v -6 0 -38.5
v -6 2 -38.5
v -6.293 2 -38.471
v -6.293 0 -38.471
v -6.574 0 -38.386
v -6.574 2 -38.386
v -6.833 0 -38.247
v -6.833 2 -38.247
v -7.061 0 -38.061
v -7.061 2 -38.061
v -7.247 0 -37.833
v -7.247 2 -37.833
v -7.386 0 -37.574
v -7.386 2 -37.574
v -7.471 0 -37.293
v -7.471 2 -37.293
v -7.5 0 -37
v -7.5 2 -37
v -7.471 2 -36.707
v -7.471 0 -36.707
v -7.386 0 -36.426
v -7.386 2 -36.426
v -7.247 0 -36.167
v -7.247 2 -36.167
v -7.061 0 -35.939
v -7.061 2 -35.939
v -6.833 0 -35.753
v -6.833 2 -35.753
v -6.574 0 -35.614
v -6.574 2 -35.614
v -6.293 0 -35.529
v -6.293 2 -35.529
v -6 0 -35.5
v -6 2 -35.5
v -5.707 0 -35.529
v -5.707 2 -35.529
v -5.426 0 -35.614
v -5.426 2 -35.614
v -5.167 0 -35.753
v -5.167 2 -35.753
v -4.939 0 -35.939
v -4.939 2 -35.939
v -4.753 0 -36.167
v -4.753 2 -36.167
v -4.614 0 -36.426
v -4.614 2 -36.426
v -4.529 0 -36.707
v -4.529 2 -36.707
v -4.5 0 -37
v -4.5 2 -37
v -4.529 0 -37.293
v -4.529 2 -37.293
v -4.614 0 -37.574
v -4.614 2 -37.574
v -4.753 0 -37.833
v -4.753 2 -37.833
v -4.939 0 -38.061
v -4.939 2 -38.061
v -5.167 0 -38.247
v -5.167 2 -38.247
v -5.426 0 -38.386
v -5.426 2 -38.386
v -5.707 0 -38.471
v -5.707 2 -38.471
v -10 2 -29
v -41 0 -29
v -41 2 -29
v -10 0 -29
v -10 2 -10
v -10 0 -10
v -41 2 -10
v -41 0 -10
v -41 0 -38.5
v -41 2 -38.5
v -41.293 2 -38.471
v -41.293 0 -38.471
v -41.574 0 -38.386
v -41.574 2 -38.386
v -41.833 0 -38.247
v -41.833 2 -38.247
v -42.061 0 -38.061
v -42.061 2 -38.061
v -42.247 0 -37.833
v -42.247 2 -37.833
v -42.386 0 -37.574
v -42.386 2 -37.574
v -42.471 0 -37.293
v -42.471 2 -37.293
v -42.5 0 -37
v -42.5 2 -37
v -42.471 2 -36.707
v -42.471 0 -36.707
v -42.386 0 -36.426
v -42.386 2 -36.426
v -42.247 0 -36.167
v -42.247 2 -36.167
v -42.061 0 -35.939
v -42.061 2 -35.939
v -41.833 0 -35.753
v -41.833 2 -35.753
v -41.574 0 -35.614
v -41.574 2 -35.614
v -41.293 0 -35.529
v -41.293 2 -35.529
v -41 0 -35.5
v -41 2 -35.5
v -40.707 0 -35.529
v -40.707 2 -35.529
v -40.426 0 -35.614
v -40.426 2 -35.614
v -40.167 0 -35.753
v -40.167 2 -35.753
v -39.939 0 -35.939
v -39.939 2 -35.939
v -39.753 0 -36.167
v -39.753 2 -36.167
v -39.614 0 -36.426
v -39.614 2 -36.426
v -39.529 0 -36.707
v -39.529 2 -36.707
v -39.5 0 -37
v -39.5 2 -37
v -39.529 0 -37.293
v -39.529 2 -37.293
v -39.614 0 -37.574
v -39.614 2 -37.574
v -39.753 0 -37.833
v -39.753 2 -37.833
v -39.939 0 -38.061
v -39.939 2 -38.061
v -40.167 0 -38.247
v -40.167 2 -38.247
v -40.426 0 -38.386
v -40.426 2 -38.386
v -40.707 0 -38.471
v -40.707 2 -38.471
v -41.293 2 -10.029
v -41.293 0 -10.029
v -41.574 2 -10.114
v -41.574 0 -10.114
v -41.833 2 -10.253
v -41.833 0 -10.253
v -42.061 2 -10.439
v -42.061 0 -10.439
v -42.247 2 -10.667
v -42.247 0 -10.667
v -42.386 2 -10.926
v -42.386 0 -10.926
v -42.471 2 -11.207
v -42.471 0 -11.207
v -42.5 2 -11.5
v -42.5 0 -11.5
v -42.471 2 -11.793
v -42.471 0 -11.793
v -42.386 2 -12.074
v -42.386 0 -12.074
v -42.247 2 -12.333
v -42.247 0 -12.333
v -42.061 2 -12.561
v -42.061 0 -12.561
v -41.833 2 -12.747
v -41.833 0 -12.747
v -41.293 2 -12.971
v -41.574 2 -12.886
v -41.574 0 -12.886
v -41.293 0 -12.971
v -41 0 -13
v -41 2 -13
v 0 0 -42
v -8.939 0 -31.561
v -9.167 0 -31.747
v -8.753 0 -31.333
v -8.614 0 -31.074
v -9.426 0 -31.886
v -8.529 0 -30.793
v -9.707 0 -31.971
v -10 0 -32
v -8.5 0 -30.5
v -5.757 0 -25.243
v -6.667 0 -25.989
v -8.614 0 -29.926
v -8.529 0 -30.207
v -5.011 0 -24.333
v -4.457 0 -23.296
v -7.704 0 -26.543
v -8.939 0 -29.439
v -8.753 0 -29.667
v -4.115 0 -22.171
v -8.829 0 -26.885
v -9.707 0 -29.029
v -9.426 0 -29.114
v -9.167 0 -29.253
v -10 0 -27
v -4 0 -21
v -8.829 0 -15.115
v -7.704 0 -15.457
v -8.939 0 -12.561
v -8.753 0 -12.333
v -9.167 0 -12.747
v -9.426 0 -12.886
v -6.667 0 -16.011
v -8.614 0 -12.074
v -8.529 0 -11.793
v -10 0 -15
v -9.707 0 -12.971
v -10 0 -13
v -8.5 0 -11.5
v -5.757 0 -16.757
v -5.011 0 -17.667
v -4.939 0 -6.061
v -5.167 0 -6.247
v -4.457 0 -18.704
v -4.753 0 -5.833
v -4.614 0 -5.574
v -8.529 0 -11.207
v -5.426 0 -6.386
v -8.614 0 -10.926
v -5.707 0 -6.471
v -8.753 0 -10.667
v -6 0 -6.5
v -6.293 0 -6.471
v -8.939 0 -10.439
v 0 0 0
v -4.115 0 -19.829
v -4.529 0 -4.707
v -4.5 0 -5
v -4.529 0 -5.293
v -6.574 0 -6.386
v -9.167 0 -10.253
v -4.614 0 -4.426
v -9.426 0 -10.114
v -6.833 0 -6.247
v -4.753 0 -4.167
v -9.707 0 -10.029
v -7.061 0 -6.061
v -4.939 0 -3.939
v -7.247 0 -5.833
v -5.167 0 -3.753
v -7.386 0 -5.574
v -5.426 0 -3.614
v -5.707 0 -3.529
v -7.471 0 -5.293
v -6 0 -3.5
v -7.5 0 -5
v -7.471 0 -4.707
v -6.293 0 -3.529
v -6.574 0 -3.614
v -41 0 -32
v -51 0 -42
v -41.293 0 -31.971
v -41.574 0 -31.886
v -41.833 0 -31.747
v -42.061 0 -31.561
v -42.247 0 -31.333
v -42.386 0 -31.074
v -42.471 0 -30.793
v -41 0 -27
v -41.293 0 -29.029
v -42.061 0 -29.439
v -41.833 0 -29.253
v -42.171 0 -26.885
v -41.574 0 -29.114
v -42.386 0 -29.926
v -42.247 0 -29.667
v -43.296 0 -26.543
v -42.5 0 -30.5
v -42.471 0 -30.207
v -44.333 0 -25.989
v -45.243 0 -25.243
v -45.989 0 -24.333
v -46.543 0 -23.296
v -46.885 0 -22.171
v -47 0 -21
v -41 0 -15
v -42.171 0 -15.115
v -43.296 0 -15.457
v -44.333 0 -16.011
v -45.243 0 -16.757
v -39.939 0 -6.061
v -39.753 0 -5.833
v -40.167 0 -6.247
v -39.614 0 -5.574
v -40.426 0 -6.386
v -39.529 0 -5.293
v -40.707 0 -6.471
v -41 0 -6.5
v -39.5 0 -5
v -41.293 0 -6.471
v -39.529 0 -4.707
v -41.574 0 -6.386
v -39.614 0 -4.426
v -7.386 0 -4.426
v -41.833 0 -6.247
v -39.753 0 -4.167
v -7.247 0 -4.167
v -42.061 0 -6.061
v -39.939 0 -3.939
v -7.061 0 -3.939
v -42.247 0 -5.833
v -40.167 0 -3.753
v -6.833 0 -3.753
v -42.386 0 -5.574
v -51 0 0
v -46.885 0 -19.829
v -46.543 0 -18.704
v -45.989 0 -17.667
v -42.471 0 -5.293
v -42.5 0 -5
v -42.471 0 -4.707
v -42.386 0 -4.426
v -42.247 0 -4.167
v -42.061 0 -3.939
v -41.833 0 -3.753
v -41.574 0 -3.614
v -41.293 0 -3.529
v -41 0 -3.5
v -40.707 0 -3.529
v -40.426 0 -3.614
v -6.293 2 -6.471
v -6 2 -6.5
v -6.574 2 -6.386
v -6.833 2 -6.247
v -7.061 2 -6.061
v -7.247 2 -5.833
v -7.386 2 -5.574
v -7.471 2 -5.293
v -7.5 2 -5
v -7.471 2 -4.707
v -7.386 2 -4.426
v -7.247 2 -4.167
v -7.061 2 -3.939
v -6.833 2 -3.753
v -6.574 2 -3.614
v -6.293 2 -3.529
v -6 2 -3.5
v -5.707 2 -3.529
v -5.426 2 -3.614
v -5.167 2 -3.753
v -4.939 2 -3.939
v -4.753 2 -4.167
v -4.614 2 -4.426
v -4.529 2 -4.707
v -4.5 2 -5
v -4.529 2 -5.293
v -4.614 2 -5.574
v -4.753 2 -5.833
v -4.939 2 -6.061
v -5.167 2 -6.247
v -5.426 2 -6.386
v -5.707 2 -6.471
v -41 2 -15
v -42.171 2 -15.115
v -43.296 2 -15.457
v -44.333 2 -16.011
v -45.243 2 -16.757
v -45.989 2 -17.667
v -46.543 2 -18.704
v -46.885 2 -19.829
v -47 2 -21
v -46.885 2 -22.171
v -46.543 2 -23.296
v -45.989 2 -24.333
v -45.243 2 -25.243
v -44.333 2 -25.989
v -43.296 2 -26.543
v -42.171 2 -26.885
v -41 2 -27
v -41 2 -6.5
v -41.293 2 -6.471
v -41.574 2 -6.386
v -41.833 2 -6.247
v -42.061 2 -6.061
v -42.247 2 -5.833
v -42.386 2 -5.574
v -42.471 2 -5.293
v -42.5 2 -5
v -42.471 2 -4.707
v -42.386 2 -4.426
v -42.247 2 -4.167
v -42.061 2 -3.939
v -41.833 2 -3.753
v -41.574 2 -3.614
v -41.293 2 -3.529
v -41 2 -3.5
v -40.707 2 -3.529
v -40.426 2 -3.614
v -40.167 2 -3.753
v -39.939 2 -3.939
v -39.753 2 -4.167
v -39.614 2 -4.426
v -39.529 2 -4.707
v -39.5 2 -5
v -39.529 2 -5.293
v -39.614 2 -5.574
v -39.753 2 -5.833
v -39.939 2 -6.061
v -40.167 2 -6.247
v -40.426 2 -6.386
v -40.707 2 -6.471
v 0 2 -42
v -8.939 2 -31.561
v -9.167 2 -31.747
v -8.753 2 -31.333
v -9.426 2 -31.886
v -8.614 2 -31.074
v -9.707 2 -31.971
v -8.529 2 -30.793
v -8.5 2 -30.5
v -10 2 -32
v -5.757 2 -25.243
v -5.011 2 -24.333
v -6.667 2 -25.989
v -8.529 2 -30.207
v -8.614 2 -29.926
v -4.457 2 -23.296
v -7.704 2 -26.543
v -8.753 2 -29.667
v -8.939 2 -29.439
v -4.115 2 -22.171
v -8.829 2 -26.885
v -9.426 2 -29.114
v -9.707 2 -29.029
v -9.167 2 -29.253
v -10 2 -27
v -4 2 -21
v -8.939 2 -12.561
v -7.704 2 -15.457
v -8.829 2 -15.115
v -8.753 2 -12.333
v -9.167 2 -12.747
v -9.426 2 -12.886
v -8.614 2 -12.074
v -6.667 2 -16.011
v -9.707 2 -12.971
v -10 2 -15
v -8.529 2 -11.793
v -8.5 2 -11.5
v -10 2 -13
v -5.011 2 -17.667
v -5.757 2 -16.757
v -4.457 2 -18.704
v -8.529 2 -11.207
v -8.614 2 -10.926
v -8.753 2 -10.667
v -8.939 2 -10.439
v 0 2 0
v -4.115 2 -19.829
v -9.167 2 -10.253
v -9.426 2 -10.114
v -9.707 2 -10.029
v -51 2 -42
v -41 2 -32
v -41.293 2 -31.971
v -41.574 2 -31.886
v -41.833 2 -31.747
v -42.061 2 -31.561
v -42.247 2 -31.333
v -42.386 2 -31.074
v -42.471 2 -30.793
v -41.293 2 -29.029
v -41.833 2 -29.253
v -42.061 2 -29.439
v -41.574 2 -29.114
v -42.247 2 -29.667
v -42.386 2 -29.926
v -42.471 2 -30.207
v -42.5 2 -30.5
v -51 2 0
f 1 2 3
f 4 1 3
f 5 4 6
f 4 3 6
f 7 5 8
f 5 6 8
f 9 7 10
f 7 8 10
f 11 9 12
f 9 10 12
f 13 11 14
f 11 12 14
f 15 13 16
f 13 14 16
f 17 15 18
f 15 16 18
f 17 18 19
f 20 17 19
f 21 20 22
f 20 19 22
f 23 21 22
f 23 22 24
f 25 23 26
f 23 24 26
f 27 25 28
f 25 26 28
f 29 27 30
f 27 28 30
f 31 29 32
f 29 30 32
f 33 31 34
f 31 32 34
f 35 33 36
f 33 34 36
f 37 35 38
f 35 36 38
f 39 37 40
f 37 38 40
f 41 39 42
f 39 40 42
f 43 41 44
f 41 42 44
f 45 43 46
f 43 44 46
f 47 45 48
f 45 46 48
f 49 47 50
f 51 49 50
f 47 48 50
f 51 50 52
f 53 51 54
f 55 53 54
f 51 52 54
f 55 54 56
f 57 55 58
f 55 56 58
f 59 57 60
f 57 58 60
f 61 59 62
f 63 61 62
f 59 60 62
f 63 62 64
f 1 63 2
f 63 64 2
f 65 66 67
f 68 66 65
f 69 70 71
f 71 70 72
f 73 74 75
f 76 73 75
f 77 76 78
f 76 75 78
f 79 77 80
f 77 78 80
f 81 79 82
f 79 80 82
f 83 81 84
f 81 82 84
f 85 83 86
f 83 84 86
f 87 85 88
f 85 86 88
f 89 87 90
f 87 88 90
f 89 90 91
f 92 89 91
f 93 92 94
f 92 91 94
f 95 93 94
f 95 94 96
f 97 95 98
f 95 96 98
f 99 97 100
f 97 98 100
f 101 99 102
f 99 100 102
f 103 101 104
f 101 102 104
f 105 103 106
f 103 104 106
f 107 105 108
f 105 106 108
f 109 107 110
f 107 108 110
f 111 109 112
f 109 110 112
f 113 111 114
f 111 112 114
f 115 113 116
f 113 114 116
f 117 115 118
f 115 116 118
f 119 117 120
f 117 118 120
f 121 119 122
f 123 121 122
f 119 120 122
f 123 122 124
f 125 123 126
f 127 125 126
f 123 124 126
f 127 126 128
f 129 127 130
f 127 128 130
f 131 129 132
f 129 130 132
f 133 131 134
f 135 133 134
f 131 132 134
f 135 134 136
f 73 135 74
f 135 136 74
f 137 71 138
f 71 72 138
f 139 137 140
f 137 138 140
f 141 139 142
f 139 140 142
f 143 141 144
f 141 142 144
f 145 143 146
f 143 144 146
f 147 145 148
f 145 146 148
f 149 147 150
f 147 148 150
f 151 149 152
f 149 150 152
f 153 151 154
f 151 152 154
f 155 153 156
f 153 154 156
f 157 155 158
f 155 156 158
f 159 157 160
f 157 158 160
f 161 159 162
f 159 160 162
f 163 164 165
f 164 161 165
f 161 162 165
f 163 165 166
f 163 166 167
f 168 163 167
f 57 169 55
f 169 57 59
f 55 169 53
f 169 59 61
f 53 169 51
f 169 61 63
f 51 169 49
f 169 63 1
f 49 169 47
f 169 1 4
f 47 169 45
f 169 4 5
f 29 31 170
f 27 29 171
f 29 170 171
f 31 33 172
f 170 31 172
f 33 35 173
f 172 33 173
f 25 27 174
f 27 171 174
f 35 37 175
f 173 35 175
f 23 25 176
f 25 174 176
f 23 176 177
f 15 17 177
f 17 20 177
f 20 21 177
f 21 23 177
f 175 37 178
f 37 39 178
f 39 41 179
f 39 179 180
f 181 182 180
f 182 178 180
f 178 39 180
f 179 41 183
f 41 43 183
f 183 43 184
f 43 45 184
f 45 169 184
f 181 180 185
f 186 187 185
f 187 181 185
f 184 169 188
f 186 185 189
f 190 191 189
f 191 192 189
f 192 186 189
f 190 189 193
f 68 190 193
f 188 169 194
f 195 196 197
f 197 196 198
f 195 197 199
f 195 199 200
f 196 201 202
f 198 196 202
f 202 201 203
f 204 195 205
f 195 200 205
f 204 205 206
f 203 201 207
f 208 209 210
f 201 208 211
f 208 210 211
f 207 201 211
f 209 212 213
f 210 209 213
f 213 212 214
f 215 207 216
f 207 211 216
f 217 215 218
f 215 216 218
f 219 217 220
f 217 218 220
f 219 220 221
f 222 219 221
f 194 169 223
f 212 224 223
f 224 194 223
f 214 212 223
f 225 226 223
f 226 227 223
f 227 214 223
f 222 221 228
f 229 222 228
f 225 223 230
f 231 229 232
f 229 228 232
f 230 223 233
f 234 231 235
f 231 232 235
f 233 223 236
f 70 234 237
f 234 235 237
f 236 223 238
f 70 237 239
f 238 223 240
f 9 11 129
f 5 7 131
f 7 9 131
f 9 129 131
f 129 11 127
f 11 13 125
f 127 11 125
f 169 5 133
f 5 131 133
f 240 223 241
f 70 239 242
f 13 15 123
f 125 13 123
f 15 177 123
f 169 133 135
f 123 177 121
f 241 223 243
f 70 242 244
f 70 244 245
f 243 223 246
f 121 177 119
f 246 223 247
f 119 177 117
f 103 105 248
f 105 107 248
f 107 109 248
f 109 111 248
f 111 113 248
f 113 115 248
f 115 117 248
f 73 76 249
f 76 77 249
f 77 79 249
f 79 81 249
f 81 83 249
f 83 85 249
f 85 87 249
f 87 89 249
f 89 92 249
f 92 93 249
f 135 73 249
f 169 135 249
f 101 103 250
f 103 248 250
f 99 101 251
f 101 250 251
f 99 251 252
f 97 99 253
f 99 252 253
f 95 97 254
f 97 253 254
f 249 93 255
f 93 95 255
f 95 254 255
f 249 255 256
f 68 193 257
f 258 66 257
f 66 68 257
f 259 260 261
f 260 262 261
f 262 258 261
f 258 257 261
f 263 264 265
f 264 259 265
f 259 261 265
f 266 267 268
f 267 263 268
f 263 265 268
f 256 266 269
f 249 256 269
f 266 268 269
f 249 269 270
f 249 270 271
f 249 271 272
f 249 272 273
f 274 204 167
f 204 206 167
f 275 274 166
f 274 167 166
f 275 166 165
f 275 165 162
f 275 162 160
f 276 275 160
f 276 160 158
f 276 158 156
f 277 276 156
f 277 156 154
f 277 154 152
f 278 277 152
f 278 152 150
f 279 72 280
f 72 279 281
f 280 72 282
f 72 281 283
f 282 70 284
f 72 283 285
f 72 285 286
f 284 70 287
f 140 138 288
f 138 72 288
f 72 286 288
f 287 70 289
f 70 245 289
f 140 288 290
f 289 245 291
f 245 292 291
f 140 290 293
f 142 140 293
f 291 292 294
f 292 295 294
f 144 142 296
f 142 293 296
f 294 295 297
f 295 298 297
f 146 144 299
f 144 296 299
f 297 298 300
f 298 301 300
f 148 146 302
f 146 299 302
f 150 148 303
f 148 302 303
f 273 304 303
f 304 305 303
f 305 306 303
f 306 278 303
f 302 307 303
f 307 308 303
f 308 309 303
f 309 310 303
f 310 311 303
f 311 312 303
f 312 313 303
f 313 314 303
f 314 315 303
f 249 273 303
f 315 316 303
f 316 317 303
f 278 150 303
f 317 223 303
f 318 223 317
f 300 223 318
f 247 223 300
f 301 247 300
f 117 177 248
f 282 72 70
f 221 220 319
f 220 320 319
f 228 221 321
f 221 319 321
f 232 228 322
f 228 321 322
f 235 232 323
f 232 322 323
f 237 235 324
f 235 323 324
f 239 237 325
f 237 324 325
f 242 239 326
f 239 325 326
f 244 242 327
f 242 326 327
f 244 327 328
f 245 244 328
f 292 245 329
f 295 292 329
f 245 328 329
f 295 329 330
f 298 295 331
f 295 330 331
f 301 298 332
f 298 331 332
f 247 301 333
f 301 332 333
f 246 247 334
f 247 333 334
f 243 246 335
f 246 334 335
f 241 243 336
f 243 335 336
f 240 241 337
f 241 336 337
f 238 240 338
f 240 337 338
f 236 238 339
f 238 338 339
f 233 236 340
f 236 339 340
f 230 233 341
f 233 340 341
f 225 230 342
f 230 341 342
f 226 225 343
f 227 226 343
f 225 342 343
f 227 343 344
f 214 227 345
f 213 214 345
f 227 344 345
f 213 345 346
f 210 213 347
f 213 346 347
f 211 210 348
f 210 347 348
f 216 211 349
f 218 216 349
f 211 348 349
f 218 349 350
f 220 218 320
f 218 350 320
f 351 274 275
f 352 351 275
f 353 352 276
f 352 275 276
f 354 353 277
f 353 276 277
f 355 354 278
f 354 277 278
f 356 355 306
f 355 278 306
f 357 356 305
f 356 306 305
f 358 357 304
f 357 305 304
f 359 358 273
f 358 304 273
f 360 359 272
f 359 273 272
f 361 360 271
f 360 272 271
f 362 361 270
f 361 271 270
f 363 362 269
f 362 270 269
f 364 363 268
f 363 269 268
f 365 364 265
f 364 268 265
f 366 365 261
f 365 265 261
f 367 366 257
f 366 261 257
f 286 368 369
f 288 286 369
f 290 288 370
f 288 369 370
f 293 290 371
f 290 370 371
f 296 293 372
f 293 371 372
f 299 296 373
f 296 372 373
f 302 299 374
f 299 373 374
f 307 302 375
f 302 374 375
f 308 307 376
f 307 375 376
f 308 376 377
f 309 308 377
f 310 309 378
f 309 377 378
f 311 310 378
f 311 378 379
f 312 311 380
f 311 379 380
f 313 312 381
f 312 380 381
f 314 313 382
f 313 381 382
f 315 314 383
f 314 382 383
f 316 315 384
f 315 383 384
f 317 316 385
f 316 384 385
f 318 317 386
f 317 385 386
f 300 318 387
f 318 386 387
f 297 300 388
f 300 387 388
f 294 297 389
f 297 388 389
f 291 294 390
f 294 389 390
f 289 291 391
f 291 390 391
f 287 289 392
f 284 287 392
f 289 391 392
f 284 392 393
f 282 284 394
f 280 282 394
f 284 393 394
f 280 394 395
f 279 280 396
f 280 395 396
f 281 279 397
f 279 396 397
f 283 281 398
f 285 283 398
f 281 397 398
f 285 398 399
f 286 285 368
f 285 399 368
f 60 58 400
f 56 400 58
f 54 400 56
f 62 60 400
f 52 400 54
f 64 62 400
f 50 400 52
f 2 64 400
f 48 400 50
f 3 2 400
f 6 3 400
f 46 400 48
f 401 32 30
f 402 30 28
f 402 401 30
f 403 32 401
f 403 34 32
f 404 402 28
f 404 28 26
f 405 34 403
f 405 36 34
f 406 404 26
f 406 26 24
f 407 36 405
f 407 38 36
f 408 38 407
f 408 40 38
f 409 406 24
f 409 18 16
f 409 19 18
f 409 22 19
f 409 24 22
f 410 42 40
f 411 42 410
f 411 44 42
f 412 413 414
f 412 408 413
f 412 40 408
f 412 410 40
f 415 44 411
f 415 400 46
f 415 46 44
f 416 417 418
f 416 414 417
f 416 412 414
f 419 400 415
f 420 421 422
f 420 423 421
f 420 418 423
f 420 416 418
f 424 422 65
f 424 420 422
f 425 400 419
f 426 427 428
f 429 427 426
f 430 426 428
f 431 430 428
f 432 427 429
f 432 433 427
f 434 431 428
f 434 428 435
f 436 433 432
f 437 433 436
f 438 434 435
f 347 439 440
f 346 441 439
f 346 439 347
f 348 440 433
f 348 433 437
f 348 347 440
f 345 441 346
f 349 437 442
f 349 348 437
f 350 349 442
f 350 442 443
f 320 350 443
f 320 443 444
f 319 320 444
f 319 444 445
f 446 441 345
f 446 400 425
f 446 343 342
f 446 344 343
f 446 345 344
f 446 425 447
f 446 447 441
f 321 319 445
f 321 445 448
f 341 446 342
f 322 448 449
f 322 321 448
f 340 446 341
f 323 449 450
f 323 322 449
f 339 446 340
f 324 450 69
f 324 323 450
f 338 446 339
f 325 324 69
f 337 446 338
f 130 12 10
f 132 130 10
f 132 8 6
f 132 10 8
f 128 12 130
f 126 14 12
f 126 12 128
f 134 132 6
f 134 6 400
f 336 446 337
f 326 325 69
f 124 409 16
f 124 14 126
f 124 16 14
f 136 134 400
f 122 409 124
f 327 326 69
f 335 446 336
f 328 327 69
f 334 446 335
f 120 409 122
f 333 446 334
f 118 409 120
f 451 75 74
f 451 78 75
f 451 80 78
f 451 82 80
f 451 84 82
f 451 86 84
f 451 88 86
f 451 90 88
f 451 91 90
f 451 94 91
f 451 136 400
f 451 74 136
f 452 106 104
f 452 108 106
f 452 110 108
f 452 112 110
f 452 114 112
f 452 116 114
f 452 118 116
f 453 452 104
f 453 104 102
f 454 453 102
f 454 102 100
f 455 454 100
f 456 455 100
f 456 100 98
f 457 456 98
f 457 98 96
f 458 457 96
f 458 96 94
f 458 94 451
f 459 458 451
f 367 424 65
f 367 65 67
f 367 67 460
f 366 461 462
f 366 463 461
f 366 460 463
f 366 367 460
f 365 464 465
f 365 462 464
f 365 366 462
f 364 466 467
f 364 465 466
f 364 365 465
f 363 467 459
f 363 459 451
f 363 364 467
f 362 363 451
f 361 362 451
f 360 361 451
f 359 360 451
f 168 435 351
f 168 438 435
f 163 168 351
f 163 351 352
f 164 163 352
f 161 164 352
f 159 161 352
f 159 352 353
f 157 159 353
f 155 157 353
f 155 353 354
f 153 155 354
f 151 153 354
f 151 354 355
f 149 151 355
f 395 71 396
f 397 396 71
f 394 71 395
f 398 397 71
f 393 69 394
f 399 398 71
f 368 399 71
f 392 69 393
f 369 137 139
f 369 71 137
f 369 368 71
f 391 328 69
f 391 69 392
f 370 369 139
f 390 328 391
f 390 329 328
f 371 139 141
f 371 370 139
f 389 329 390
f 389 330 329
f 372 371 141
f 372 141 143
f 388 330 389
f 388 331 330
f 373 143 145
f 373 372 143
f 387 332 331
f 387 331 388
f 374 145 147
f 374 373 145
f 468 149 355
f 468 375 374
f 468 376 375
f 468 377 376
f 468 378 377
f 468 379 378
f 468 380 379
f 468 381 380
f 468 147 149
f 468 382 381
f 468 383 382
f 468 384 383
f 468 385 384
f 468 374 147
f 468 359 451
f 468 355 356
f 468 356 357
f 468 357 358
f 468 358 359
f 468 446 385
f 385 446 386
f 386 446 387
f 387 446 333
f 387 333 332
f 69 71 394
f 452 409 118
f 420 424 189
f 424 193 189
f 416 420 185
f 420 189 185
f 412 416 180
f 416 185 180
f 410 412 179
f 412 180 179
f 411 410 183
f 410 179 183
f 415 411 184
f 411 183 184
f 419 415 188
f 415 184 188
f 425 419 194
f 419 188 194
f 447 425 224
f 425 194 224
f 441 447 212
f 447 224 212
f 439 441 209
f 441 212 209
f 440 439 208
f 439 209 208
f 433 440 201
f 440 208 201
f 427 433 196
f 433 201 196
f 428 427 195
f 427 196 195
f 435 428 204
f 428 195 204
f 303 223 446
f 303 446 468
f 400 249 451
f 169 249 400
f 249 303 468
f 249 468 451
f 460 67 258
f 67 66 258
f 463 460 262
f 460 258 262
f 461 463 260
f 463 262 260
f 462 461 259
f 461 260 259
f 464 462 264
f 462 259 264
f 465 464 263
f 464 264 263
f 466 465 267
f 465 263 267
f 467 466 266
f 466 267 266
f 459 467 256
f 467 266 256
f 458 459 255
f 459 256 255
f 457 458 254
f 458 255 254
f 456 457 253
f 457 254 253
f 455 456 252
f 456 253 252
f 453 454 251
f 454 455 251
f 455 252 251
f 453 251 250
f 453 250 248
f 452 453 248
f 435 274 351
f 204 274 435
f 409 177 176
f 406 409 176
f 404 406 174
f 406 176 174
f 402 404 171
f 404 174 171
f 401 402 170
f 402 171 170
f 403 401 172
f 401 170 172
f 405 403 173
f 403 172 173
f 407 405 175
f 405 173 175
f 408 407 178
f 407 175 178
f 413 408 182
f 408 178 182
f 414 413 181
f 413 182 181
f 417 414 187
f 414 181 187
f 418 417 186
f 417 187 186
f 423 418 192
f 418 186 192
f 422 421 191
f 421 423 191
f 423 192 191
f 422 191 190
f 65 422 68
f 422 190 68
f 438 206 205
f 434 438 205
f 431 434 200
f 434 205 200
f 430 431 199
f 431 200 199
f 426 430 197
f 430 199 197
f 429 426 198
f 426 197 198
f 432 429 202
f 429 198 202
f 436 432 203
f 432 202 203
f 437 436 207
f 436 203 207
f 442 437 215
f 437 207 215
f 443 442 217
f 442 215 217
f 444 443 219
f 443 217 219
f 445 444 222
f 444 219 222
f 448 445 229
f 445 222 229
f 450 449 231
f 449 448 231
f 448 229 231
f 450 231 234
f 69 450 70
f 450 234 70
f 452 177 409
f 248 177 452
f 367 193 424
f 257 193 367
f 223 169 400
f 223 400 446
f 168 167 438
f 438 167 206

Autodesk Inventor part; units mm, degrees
ref_plane "YZ Plane" through (0, 0, 0) normal (1, 0, 0) x (0, 1, 0)
ref_plane "XZ Plane" through (0, 0, 0) normal (0, 1, 0) x (-1, 0, 0)
ref_plane "XY Plane" through (0, 0, 0) normal (0, 0, 1) x (1, 0, 0)
sketch "Sketch1" plane through (0, 0, 0) normal (0, 1, 0) x (-1, 0, 0)
  line L0 (0, 0) -> (51, 0)
  line L1 (51, 0) -> (51, -42)
  line L2 (51, -42) -> (0, -42)
  line L3 (0, -42) -> (0, 0)
  line L4 (51, -21) -> (0, -21)
  line L5 (25.5, 0) -> (25.5, -42)
  line L6 (41, -21) -> (10, -21) construction
  line L7 (41, -15) -> (10, -15)
  line L8 (10, -27) -> (41, -27)
  arc A0 (41, -27) -> (41, -15) centre (41, -21) ccw
  arc A1 (10, -15) -> (10, -27) centre (10, -21) ccw
  line L9 (41, -30.5) -> (10, -30.5) construction
  line L10 (41, -29) -> (10, -29)
  line L11 (10, -32) -> (41, -32)
  arc A2 (41, -32) -> (41, -29) centre (41, -30.5) ccw
  arc A3 (10, -29) -> (10, -32) centre (10, -30.5) ccw
  line L12 (41, -13) -> (10, -13)
  line L13 (10, -10) -> (41, -10)
  arc A4 (41, -13) -> (41, -10) centre (41, -11.5) ccw
  arc A5 (10, -10) -> (10, -13) centre (10, -11.5) ccw
  point P0 (41, -5)
  point P1 (41, -37)
  point P2 (10, -5)
  point P3 (10, -37)
  point P4 (25.5, -21)
  point P5 (35.9893, -30.5)
  point P6 (25.5, -30.5)
  point P7 (6, -5)
  point P8 (6, -37)
  dimension "d0" = 51
  dimension "d1" = 42
  dimension "d2" = 10
  dimension "d3" = 5
  dimension "d4" = 10
  dimension "d5" = 10
  dimension "d6" = 12
  dimension "d7" = 3.5
  dimension "d8" = 3
  dimension "d18" = 6
  dimension "d19" = 6
  dimension "d20" = 3.5
extrude "Extrusion1" add sketch "Sketch1" along normal blind 2 contours L0 L5 L13 A5 L12 L7 A1 L4 L3 | L0 L1 L4 A0 L7 L5 L12 A4 L13 | L4 A1 L8 L5 L10 A3 L11 L2 L3 | L1 L2 L5 L11 A2 L10 L8 A0 L4
hole "Hole1" at (-41, 0, -5) at (-41, 0, -37) at (-41, 0, -21) at (-10, 0, -21) at (-35.9893, 0, -30.5) at (-41, 0, -30.5) at (-10, 0, -30.5) at (-41, 0, -11.5) at (-10, 0, -11.5) at (-6, 0, -5) at (-6, 0, -37) direction (0, 1, 0) diameter 3 depth 43.75 tip angle 118
equation "\"d20\" = d7"
properties part number "temsion1" material "アルミニウム 6061"
